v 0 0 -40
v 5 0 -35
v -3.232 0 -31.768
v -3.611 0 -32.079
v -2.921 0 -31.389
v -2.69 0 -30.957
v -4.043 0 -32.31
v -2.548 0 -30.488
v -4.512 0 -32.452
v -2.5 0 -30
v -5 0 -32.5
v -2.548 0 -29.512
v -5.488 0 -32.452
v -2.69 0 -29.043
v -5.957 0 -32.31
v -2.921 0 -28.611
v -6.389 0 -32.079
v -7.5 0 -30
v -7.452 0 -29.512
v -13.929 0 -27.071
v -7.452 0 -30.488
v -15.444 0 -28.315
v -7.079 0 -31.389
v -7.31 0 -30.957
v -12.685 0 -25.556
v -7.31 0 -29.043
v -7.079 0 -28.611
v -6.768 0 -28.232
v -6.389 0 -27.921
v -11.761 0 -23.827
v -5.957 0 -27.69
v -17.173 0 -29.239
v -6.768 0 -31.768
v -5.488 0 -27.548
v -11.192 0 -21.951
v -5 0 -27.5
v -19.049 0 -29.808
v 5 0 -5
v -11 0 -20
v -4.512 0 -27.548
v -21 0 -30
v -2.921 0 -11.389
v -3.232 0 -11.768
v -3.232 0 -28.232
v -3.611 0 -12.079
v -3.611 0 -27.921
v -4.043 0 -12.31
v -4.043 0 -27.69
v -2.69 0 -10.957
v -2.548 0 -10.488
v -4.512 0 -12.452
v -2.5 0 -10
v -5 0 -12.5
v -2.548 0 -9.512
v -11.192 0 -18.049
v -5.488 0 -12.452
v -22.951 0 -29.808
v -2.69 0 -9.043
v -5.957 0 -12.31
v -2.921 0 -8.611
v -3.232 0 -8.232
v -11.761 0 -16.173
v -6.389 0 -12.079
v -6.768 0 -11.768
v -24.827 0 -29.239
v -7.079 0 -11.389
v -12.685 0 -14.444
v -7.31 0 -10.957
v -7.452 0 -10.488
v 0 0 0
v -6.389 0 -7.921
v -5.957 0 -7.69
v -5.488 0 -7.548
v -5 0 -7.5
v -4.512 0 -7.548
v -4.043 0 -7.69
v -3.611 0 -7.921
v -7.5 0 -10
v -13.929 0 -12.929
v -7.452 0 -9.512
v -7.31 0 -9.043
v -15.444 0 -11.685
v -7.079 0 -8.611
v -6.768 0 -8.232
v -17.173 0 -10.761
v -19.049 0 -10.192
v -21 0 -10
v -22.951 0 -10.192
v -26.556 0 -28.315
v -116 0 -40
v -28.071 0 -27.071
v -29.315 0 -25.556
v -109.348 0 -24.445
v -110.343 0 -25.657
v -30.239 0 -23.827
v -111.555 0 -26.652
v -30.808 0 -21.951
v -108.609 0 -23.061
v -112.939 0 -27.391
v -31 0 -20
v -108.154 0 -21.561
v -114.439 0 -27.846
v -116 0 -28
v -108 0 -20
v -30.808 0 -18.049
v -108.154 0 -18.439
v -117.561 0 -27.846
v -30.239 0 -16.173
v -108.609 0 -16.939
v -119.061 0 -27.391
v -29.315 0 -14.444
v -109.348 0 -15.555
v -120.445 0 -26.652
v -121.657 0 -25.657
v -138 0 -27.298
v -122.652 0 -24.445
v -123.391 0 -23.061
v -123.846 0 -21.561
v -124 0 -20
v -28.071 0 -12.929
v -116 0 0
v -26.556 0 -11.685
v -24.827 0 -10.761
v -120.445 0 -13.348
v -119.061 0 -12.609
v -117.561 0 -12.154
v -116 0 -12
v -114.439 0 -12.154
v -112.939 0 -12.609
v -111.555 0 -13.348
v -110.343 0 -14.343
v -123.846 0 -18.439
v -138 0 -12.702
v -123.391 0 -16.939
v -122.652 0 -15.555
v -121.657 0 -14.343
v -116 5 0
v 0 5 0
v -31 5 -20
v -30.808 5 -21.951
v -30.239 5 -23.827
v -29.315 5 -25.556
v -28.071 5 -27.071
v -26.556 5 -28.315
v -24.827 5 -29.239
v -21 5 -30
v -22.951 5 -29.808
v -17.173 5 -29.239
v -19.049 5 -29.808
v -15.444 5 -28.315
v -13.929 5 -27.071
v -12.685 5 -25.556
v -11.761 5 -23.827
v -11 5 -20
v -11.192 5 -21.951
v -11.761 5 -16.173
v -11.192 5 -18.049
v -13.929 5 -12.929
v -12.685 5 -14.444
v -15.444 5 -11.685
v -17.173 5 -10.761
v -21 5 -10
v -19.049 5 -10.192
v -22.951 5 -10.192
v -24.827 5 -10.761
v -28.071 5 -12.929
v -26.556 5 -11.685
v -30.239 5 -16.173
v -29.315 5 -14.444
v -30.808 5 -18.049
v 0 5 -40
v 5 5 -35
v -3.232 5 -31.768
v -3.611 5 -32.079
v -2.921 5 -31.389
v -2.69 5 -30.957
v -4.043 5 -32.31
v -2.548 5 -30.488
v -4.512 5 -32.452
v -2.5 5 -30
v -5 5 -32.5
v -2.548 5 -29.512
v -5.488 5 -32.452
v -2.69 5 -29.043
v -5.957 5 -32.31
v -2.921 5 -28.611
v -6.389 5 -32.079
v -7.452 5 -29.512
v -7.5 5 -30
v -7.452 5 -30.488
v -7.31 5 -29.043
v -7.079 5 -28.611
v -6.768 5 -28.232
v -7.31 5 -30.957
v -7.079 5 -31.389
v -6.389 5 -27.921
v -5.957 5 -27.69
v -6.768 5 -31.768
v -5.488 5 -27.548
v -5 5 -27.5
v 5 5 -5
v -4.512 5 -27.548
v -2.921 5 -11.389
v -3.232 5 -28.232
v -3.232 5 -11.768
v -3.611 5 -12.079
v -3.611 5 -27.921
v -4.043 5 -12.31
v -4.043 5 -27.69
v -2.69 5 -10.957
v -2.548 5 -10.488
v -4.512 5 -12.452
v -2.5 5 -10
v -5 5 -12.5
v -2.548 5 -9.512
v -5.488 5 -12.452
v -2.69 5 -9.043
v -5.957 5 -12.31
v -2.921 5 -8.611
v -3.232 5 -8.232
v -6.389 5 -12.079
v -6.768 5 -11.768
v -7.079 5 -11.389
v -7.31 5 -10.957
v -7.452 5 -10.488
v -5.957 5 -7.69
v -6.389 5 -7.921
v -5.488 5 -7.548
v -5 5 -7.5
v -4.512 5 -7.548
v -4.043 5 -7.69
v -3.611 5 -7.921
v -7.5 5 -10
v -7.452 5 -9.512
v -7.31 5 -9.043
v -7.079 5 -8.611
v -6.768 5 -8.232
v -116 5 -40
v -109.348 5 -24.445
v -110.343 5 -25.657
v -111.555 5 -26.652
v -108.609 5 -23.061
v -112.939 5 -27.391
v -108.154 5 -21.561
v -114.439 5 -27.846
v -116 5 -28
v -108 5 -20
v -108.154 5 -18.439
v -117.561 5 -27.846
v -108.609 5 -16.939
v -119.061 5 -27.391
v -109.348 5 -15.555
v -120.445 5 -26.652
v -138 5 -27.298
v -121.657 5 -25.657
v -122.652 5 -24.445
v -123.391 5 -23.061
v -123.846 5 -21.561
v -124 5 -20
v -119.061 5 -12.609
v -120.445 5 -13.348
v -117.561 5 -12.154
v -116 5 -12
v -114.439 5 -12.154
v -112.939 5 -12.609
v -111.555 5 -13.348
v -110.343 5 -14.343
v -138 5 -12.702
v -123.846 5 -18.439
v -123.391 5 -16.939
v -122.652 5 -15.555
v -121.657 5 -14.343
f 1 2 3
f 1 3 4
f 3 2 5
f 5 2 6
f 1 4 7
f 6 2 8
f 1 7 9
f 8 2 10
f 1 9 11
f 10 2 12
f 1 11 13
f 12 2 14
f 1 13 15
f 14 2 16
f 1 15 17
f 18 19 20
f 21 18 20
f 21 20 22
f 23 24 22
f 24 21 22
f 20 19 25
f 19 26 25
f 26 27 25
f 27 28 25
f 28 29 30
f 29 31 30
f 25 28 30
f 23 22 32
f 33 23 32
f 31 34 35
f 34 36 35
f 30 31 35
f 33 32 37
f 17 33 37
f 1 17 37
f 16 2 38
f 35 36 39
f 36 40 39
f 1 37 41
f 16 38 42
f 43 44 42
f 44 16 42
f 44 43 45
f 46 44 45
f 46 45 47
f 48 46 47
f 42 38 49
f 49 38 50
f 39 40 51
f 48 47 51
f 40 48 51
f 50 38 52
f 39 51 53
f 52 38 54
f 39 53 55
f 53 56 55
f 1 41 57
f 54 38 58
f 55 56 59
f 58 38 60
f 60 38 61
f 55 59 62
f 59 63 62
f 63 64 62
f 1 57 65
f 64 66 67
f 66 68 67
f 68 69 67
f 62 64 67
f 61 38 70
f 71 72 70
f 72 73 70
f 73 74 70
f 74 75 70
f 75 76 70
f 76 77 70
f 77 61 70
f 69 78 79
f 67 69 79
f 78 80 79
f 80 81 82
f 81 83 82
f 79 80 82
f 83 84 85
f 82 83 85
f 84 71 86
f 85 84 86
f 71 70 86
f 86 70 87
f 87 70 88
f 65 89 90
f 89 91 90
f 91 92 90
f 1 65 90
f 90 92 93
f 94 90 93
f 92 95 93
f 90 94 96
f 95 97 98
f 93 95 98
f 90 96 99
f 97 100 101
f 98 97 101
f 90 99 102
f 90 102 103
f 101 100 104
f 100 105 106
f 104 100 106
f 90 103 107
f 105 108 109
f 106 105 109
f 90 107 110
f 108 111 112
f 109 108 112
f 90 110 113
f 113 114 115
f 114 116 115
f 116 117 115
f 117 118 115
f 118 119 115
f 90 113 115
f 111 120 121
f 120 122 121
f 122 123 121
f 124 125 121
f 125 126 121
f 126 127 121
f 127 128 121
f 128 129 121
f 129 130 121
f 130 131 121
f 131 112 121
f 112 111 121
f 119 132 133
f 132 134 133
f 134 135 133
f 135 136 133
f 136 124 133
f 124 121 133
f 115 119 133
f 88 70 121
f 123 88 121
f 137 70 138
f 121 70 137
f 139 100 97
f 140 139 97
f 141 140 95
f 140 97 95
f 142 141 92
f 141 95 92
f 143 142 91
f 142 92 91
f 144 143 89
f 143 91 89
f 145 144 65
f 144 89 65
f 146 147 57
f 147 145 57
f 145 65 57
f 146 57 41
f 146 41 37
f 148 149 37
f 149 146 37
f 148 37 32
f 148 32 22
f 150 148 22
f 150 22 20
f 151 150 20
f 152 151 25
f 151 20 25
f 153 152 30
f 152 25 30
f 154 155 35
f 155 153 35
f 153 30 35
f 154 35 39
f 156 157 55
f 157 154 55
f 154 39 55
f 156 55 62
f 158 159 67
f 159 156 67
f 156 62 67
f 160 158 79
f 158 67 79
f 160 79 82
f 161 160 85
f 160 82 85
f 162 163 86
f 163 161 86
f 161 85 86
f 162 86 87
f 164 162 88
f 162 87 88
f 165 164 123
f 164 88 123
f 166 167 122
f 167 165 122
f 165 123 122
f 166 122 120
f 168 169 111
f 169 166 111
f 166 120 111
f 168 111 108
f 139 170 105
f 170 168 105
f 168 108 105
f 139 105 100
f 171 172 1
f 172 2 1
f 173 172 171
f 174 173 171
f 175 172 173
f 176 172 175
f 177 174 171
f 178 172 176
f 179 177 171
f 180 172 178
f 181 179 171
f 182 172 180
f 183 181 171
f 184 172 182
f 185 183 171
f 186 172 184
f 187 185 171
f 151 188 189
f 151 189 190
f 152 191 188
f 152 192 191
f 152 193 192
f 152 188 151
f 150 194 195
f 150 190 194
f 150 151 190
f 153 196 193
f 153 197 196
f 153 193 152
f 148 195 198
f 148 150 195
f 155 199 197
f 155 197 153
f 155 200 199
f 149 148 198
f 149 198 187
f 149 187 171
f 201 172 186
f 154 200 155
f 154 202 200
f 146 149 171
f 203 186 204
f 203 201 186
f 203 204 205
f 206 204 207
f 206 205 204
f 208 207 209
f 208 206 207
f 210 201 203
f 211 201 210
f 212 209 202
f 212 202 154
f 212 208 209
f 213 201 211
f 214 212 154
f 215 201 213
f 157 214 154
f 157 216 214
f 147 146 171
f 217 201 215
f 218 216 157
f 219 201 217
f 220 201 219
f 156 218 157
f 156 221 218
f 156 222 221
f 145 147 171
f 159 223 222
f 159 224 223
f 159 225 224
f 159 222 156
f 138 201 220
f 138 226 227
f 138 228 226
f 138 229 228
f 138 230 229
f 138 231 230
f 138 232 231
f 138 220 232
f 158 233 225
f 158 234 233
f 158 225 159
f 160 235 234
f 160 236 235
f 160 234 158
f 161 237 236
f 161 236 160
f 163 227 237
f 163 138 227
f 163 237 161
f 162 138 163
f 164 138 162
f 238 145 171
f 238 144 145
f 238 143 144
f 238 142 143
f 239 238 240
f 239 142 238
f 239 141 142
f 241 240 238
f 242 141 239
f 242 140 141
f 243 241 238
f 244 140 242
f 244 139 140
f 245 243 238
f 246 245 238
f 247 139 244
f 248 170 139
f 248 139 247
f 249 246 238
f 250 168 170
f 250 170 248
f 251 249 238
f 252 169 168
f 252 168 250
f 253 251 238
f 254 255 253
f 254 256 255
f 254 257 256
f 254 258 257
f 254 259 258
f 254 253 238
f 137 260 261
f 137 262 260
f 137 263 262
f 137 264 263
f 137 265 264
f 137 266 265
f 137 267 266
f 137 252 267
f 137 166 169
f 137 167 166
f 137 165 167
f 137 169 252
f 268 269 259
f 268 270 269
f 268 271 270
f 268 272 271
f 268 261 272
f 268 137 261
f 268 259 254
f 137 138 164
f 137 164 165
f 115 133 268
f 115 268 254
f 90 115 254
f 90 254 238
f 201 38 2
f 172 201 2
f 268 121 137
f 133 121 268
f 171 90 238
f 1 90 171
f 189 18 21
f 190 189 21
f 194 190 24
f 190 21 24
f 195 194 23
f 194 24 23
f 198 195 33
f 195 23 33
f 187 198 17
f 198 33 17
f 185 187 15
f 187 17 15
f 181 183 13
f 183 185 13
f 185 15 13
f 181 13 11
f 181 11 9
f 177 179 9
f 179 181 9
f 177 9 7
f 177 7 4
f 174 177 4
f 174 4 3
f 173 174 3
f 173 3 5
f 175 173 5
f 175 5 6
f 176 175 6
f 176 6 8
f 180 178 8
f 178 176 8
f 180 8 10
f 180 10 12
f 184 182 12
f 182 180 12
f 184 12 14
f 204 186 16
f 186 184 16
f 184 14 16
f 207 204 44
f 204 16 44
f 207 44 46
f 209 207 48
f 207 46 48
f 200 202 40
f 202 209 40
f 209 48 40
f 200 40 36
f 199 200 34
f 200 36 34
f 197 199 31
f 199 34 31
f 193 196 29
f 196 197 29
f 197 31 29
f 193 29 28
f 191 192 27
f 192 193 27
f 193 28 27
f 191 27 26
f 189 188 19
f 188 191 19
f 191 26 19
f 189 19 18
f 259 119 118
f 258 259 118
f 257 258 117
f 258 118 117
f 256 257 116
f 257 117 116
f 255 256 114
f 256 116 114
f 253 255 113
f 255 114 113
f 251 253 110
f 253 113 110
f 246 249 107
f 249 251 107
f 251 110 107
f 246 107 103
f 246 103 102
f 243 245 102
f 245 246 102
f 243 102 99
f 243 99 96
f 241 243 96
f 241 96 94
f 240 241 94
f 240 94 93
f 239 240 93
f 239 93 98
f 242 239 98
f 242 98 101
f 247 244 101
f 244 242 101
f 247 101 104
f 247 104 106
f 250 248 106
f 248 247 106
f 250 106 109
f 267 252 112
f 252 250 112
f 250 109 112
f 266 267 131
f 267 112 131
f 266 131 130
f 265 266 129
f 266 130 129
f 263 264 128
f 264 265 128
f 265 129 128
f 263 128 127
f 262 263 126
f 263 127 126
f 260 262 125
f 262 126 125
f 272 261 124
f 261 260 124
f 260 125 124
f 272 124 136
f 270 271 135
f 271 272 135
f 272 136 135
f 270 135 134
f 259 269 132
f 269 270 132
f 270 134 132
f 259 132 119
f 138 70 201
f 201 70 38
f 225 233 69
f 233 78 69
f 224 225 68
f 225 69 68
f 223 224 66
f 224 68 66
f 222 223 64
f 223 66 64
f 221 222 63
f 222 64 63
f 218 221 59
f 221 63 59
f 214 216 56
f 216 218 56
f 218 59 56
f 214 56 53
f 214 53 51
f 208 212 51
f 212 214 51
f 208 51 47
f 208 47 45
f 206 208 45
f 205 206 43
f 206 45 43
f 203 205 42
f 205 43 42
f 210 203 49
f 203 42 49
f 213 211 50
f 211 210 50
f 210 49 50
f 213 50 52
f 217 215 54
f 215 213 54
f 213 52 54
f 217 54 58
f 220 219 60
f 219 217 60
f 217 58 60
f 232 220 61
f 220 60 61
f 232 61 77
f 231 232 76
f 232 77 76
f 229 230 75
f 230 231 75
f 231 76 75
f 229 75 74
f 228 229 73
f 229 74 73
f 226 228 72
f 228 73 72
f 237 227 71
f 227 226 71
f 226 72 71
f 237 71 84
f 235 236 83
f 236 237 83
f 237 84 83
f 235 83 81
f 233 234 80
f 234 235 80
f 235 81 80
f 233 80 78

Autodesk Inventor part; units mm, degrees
ref_plane "YZ Plane" through (0, 0, 0) normal (1, 0, 0) x (0, 1, 0)
ref_plane "XZ Plane" through (0, 0, 0) normal (0, 1, 0) x (-1, 0, 0)
ref_plane "XY Plane" through (0, 0, 0) normal (0, 0, 1) x (1, 0, 0)
sketch "Náčrt1" plane through (0, 0, 0) normal (0, 1, 0) x (-1, 0, 0)
  line L0 (0, 0) -> (116, 0)
  line L1 (116, -40) -> (0, -40)
  circle A0 centre (21, -20) radius 10
  line L2 (116, 0) -> (138, -12.7017)
  line L3 (138, -12.7017) -> (138, -27.2983)
  line L4 (138, -27.2983) -> (116, -40)
  line L5 (0, 0) -> (-5, -5)
  line L6 (-5, -5) -> (-5, -35)
  line L7 (-5, -35) -> (0, -40)
  circle A1 centre (116, -20) radius 8
  circle A2 centre (5, -30) radius 2.5
  circle A3 centre (5, -10) radius 2.5
  dimension "d0" = 5
  dimension "d1" = 5
  dimension "d2" = 5
  dimension "d3" = 143
  dimension "d4" = 16
  dimension "d5" = 20
  dimension "d6" = 40
  dimension "d7" = 20
  dimension "d8" = 26
  dimension "d9" = 30
  dimension "d10" = 95
  dimension "d11" = 121
  dimension "d13" = 30
  dimension "d14" = 20
  dimension "d15" = 5
  dimension "d16" = 5
  dimension "d17" = 10
  dimension "d18" = 10
  dimension "d19" = 10
  dimension "d20" = 10
extrude "Vysunutí1" add sketch "Náčrt1" along normal blind 5
thread "Závit1" size "M5x0.8" class "6H" standard "ANSI Metric M Profile" full length
thread "Závit2" size "M5x0.8" class "6H" standard "ANSI Metric M Profile" full length
equation "\"d11\" = d10 + d8"
equation "\"d13\" = d9"
properties part number "bočnice"
